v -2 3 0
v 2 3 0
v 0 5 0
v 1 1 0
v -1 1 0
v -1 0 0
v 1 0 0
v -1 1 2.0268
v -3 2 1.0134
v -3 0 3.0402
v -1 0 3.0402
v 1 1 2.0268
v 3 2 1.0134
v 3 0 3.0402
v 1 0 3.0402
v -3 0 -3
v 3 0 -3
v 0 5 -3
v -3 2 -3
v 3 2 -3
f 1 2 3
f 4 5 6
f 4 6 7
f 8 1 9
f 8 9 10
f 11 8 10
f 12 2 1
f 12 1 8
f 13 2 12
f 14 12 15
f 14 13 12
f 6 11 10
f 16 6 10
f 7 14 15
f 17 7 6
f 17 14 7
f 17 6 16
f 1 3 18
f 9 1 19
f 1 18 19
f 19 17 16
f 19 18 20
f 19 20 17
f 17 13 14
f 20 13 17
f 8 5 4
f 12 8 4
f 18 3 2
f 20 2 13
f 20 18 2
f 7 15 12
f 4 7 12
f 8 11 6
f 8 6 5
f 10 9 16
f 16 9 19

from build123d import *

# Parameters (mm, degrees)
BOSS_EXTRUDE1_DEPTH = 3
BOSS_EXTRUDE2_DEPTH = 6
SKETCH3_W           = 2
SKETCH3_H           = 1
CUT_EXTRUDE1_DEPTH  = 6


with BuildPart() as part:
    # Sketch1 → Boss-Extrude1 (new body)
    with BuildSketch(Plane.XY):
        Polygon((3, 0), (-3, 0), (-3, 2), (0, 5), (3, 2), align=None)
    extrude(amount=-BOSS_EXTRUDE1_DEPTH)

    # Sketch2 → Boss-Extrude2 (add)
    with BuildSketch(Plane(origin=(3, 0, 0), x_dir=(0, 0, -1), z_dir=(1, 0, 0))):
        Polygon((0, 3), (-3.04018422, 0), (0, 0), align=None)
    extrude(amount=-BOSS_EXTRUDE2_DEPTH)

    # Sketch3 → Cut-Extrude1 (cut)
    with BuildSketch(Plane.XY):
        Polygon((-2, 3), (-3, 2), (-3, 3), align=None)
        Polygon((2, 3), (3, 2), (3, 3), align=None)
        with Locations((0, 0.5)):
            Rectangle(SKETCH3_W, SKETCH3_H)
    extrude(amount=CUT_EXTRUDE1_DEPTH, mode=Mode.SUBTRACT)


solid = part.part
